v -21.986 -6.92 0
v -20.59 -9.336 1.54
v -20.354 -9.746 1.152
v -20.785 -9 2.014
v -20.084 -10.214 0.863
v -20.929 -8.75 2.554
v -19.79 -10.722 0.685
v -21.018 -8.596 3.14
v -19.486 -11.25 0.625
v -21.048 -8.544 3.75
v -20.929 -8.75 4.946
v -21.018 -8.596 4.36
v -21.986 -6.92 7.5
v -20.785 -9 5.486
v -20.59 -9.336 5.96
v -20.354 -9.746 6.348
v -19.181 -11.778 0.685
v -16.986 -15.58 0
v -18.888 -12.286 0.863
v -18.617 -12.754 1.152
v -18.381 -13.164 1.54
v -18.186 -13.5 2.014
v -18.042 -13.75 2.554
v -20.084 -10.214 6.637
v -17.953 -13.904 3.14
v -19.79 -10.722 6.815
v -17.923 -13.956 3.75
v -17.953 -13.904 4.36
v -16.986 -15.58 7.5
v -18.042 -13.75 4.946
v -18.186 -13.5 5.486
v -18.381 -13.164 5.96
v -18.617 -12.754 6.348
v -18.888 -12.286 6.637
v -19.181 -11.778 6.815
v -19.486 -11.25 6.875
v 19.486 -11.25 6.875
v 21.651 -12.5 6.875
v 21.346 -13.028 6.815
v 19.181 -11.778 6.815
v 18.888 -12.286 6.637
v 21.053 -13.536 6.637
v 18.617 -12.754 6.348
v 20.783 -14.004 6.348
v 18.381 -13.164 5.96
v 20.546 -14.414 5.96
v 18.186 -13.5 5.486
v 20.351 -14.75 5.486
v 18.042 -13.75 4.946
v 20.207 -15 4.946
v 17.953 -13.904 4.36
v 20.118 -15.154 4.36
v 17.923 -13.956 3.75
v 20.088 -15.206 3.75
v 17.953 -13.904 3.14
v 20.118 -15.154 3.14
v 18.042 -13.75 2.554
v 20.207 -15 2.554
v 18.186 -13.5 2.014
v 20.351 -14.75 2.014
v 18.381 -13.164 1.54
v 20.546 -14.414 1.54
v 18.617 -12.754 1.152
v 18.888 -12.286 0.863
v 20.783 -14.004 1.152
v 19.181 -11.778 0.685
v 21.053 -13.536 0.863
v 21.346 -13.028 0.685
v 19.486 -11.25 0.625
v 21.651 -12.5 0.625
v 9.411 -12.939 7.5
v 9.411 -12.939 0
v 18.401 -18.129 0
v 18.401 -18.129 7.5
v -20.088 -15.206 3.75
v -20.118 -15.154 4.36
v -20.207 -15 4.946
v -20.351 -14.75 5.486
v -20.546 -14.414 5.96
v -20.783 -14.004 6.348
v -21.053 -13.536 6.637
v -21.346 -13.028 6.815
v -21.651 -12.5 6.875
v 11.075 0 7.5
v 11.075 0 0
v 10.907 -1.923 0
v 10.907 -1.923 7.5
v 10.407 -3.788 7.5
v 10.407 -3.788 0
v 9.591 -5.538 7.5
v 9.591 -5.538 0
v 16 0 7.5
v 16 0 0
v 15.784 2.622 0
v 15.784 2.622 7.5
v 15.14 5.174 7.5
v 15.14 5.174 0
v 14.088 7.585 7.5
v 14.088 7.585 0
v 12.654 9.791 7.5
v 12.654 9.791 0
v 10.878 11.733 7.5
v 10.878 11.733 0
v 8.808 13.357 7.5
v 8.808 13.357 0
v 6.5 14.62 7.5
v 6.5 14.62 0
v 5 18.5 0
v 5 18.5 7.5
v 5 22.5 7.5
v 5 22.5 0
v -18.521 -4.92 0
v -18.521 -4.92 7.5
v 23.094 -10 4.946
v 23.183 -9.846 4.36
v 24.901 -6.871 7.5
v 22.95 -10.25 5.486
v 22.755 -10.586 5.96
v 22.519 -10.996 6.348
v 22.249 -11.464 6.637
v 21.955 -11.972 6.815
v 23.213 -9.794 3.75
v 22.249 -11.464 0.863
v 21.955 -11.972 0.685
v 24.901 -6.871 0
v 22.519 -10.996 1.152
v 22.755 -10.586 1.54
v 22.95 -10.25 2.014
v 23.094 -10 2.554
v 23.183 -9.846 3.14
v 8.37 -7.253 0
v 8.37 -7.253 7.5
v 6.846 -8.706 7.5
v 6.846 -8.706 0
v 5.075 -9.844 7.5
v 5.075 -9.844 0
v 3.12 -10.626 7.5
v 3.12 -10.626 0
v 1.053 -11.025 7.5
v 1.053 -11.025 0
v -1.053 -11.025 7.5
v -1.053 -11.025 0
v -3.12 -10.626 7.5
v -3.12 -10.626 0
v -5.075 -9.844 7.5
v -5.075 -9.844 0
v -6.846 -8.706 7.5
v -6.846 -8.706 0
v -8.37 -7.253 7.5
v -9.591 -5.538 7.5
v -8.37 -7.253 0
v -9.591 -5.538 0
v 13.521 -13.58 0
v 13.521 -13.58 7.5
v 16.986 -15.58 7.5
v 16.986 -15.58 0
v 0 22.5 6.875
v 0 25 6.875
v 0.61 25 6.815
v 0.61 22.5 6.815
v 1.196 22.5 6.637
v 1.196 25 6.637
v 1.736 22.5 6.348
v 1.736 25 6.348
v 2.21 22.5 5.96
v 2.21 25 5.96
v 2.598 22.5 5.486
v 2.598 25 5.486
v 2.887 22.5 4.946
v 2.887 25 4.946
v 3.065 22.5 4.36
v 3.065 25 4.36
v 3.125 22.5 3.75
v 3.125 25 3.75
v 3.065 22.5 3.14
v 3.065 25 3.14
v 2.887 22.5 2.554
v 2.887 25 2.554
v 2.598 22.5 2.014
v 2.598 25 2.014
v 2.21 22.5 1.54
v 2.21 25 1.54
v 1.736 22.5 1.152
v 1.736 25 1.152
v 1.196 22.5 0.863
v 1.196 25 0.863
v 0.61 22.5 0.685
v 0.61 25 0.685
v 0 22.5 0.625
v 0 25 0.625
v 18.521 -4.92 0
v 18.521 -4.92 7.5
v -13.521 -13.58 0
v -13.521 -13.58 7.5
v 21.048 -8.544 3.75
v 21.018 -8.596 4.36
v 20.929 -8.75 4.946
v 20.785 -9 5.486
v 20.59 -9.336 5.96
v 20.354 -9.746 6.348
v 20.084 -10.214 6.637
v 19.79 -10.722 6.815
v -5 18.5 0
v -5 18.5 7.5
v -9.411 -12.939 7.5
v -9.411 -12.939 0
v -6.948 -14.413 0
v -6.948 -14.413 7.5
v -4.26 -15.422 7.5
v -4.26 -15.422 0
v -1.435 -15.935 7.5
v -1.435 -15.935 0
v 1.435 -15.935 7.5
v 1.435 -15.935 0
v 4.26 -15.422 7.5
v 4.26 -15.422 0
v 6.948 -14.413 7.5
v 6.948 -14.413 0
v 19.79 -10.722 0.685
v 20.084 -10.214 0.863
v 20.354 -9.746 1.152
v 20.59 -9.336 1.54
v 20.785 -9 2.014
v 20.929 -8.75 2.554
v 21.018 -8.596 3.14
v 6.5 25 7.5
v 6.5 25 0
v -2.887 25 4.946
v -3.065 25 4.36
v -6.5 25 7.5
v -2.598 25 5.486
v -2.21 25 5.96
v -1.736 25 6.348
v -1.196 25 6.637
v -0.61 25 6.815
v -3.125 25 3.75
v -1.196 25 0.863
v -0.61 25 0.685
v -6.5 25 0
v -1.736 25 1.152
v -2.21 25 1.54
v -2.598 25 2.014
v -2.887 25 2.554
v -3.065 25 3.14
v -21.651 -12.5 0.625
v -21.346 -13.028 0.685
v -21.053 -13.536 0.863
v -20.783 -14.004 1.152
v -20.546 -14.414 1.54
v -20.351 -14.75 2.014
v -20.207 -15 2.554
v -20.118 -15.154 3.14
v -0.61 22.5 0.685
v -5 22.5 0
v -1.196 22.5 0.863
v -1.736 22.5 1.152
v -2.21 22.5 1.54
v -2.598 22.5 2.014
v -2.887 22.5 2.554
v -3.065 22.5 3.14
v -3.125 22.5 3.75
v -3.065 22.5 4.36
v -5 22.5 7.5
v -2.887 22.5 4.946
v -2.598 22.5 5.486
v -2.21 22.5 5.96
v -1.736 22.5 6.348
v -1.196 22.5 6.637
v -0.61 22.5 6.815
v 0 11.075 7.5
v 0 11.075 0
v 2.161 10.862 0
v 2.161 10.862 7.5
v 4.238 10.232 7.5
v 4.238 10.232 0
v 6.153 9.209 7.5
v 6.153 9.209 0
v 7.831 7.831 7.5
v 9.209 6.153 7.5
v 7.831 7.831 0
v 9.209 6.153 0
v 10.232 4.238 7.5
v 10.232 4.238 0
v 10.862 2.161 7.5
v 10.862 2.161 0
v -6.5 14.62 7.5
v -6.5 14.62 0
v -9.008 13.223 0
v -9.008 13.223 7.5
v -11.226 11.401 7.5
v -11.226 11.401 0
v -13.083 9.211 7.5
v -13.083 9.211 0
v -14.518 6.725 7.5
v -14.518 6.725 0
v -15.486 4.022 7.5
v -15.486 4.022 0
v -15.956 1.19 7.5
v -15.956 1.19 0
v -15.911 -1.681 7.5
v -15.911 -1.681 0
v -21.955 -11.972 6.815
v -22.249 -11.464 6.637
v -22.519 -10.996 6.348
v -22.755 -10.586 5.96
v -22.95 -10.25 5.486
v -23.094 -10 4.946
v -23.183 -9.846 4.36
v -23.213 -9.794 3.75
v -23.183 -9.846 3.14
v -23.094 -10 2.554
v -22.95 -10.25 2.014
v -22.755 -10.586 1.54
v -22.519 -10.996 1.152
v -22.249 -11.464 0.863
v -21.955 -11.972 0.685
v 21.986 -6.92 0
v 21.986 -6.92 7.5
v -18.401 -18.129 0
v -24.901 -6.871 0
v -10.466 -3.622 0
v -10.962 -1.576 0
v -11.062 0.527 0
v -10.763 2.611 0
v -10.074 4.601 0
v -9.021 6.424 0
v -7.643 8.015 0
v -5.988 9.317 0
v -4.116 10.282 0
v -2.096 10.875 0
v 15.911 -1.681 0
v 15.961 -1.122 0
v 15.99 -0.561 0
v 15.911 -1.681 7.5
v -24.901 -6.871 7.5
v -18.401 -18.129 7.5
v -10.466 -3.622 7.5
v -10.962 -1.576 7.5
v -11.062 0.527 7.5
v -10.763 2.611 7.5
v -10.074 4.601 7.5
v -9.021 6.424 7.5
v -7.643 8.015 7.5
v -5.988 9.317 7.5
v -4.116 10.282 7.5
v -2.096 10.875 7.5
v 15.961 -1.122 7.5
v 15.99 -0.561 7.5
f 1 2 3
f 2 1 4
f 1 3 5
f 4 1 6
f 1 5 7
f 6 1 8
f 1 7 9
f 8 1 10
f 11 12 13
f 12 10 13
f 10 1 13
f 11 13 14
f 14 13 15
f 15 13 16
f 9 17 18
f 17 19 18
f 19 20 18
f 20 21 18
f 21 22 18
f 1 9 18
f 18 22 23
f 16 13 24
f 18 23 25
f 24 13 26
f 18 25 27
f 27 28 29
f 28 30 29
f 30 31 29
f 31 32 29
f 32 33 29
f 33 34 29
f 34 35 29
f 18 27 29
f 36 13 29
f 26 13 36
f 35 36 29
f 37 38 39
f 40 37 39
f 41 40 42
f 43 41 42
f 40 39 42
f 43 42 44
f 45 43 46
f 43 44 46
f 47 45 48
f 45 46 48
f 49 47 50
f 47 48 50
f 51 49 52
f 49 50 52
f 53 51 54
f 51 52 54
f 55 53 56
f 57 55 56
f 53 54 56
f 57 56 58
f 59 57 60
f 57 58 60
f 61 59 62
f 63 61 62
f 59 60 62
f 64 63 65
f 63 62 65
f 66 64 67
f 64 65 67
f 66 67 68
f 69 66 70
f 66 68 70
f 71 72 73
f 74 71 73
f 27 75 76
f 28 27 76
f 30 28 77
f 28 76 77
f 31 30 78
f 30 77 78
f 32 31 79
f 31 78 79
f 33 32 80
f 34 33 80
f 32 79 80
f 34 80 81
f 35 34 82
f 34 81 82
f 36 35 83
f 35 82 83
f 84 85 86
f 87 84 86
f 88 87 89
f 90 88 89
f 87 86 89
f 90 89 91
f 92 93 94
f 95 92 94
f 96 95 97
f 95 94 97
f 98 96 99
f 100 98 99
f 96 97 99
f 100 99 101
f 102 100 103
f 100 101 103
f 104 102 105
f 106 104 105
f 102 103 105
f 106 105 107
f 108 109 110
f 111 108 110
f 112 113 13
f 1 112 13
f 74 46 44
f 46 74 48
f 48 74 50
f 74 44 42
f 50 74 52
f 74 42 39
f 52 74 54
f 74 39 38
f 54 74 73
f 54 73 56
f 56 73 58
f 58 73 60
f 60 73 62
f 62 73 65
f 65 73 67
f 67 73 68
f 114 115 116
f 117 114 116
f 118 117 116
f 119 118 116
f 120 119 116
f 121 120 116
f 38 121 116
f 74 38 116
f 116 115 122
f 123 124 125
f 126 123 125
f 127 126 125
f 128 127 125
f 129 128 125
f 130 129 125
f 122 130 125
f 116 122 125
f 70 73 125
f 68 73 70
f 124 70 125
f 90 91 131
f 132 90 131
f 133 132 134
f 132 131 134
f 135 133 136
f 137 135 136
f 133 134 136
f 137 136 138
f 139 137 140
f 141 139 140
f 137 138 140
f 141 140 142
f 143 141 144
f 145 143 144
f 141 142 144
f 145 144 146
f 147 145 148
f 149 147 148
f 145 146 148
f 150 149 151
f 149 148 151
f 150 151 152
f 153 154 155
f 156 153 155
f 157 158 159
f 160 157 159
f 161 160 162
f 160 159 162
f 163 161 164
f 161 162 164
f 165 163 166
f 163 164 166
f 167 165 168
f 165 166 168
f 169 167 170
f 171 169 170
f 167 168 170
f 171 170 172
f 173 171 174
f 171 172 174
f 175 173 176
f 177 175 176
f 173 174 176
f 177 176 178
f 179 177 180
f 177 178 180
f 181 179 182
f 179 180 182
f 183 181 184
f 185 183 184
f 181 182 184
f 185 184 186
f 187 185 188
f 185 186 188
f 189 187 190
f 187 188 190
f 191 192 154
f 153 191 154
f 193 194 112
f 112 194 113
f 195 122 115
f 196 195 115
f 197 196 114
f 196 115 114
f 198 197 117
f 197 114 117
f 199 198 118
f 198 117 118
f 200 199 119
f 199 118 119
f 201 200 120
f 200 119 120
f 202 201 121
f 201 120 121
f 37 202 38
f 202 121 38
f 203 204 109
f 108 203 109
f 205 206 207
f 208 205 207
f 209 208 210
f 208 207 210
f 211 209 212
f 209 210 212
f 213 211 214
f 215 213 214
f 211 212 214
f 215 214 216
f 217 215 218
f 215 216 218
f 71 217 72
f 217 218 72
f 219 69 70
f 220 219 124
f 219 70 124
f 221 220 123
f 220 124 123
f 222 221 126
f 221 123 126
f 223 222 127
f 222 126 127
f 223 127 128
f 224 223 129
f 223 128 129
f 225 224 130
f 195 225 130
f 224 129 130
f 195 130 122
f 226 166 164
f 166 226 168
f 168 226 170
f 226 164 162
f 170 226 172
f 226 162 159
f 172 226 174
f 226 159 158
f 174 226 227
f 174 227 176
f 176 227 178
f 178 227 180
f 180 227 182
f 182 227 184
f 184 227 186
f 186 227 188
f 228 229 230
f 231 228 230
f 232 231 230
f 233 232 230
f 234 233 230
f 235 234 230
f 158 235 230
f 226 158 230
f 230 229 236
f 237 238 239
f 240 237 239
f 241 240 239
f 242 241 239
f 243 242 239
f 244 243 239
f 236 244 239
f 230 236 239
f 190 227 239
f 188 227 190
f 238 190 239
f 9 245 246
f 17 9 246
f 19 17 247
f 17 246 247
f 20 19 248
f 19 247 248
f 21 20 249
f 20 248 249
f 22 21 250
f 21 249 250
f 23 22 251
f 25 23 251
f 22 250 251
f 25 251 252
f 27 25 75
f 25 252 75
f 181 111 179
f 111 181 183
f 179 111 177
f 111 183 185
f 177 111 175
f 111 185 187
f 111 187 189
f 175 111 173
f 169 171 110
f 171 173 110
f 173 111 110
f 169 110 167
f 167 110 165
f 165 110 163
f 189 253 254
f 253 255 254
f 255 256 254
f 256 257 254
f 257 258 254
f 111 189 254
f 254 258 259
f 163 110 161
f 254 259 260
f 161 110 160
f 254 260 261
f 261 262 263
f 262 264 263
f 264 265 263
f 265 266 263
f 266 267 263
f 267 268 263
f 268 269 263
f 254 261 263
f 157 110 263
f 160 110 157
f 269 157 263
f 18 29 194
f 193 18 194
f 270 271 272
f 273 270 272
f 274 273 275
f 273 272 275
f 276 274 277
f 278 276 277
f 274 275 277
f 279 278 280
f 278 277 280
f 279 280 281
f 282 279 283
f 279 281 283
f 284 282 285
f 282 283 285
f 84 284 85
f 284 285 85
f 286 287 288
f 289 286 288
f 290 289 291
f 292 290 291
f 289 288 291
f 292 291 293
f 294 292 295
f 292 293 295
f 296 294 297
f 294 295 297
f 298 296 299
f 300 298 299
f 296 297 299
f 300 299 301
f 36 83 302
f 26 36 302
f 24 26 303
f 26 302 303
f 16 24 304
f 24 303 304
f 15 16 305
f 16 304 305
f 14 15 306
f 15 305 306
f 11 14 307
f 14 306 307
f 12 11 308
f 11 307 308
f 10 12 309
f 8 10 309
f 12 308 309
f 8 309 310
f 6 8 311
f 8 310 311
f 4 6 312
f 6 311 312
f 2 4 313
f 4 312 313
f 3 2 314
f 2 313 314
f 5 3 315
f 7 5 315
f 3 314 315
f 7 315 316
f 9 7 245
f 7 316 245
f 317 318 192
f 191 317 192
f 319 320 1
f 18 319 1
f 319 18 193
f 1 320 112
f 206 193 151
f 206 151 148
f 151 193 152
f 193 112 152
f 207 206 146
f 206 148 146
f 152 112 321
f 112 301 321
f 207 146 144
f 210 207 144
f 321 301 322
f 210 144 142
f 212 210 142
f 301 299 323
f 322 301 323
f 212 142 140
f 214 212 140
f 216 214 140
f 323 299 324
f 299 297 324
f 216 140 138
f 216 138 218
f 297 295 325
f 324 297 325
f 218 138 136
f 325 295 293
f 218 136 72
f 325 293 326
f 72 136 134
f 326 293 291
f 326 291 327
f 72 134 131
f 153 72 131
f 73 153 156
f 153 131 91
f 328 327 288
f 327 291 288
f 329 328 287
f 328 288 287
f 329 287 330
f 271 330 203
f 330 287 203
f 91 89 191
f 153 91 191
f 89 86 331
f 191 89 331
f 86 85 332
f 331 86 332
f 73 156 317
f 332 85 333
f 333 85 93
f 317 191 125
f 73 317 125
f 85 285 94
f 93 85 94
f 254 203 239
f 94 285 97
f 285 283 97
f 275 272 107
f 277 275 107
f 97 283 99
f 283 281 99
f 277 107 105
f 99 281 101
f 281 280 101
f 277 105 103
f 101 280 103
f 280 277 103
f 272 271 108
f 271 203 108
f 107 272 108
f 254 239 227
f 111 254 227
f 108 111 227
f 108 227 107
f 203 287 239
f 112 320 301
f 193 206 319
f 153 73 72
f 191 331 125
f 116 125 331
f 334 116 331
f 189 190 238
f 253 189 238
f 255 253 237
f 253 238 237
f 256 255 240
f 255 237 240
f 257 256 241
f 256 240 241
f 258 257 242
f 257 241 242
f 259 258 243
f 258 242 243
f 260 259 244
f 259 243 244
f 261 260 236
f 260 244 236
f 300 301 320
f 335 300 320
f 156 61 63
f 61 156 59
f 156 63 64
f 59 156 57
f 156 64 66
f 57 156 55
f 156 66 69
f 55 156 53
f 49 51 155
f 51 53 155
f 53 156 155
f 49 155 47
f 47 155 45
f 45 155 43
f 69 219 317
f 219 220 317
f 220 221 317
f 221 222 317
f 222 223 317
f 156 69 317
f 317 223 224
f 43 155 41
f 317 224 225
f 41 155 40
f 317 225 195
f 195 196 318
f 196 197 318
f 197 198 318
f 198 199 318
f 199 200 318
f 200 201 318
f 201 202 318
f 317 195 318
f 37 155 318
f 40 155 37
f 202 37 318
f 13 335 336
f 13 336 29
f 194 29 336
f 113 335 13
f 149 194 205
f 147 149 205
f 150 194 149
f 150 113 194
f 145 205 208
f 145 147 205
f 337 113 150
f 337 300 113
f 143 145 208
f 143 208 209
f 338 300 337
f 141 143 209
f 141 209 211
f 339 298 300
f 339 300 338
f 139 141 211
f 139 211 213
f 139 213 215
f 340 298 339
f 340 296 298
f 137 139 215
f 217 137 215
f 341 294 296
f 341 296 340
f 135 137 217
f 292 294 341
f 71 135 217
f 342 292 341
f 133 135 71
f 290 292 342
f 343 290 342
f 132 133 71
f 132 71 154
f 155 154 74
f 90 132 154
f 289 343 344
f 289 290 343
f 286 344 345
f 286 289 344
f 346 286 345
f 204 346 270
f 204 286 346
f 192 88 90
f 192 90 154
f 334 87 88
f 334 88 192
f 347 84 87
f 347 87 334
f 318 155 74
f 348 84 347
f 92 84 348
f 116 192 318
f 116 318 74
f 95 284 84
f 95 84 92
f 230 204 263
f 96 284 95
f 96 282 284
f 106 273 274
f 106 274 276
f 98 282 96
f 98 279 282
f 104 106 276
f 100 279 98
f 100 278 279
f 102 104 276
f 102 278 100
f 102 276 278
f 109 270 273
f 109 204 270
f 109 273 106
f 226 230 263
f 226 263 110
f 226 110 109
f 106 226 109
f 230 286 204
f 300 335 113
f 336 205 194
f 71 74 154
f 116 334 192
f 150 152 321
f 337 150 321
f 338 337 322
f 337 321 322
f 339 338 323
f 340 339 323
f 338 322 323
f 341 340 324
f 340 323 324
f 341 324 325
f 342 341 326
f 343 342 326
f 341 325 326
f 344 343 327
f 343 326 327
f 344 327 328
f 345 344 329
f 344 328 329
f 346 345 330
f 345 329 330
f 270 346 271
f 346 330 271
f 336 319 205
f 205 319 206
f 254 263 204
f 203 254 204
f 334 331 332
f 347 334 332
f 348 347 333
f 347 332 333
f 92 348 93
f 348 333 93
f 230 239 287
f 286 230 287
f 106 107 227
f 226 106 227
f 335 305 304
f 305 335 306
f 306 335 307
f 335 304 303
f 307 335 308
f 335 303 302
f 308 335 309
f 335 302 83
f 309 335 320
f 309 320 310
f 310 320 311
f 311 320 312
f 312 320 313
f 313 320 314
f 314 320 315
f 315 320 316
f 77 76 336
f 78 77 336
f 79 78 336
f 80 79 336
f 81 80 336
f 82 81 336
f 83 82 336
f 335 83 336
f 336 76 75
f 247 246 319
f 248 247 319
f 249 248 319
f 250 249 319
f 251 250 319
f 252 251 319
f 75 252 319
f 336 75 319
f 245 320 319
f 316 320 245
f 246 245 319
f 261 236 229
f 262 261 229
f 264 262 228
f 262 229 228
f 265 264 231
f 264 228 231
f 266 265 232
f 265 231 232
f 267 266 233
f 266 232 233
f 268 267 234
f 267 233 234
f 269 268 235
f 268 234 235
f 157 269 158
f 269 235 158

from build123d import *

# Parameters (mm, degrees)
F1_DEPTH = 7.5
F3_DEPTH = 25
F5_DEPTH = 6
F7_DEPTH = 6
F9_DEPTH = 6


with BuildPart() as f1:
    # F0 (on Top) → F1 (new body)
    with BuildSketch(Plane.XY):
        with BuildLine():
            ThreePointArc((-9.5912313469, -5.5375), (-9.5912313469, 5.5375), (0, 11.075))
            Line((0, 11.075), (0, 16))
            ThreePointArc((0, 16), (-3.3224189775, 15.6512469835), (-6.5, 14.6201915172))
            ThreePointArc((-6.5, 14.6201915172), (-13.8564064606, 8), (-15.9114572621, -1.680930634))
            ThreePointArc((-15.9114572621, -1.680930634), (-15.2155869774, -4.9483242552), (-13.8564064606, -8))
            Line((-13.8564064606, -8), (-9.5912313469, -5.5375))
        make_face()
        with BuildLine():
            ThreePointArc((0, 11.075), (7.8312076016, 7.8312076016), (11.075, 0))
            ThreePointArc((11.075, 0), (10.6976285262, -2.8664209245), (9.5912313469, -5.5375))
            Line((9.5912313469, -5.5375), (13.8564064606, -8))
            ThreePointArc((13.8564064606, -8), (15.2155869774, -4.9483242552), (15.9114572621, -1.680930634))
            ThreePointArc((15.9114572621, -1.680930634), (15.9778489822, -0.8416305028), (16, 0))
            ThreePointArc((16, 0), (13.416407865, 8.7177978871), (6.5, 14.6201915172))
            ThreePointArc((6.5, 14.6201915172), (3.3224189775, 15.6512469835), (0, 16))
            Line((0, 16), (0, 11.075))
        make_face()
        with BuildLine():
            Line((13.8564064606, -8), (9.5912313469, -5.5375))
            ThreePointArc((9.5912313469, -5.5375), (0, -11.075), (-9.5912313469, -5.5375))
            Line((-9.5912313469, -5.5375), (-13.8564064606, -8))
            ThreePointArc((-13.8564064606, -8), (-11.8931679998, -10.7029227283), (-9.4114572621, -12.9392608832))
            ThreePointArc((-9.4114572621, -12.9392608832), (0, -16), (9.4114572621, -12.9392608832))
            ThreePointArc((9.4114572621, -12.9392608832), (11.8931679998, -10.7029227283), (13.8564064606, -8))
        make_face()
        with BuildLine():
            Line((0, 25), (0, 16))
            ThreePointArc((0, 16), (3.3224189775, 15.6512469835), (6.5, 14.6201915172))
            Line((6.5, 14.6201915172), (6.5, 25))
            Line((6.5, 25), (0, 25))
        make_face()
        with BuildLine():
            ThreePointArc((-6.5, 14.6201915172), (-3.3224189775, 15.6512469835), (0, 16))
            Line((0, 16), (0, 25))
            Line((0, 25), (-6.5, 25))
            Line((-6.5, 25), (-6.5, 14.6201915172))
        make_face()
        with BuildLine():
            Line((-21.6506350946, -12.5), (-13.8564064606, -8))
            ThreePointArc((-13.8564064606, -8), (-15.2155869774, -4.9483242552), (-15.9114572621, -1.680930634))
            Line((-15.9114572621, -1.680930634), (-24.9006350946, -6.8708348754))
            Line((-24.9006350946, -6.8708348754), (-21.6506350946, -12.5))
        make_face()
        with BuildLine():
            ThreePointArc((-9.4114572621, -12.9392608832), (-11.8931679998, -10.7029227283), (-13.8564064606, -8))
            Line((-13.8564064606, -8), (-21.6506350946, -12.5))
            Line((-21.6506350946, -12.5), (-18.4006350946, -18.1291651246))
            Line((-18.4006350946, -18.1291651246), (-9.4114572621, -12.9392608832))
        make_face()
        with BuildLine():
            Line((21.6506350946, -12.5), (13.8564064606, -8))
            ThreePointArc((13.8564064606, -8), (11.8931679998, -10.7029227283), (9.4114572621, -12.9392608832))
            Line((9.4114572621, -12.9392608832), (18.4006350946, -18.1291651246))
            Line((18.4006350946, -18.1291651246), (21.6506350946, -12.5))
        make_face()
        with BuildLine():
            ThreePointArc((15.9114572621, -1.680930634), (15.2155869774, -4.9483242552), (13.8564064606, -8))
            Line((13.8564064606, -8), (21.6506350946, -12.5))
            Line((21.6506350946, -12.5), (24.9006350946, -6.8708348754))
            Line((24.9006350946, -6.8708348754), (15.9114572621, -1.680930634))
        make_face()
    extrude(amount=F1_DEPTH)

    # F2 (on face) → F3 (cut)
    with BuildSketch(Plane.XY.offset(7.5)):
        Polygon((5, 22.5), (0, 22.5), (-5, 22.5), (-5, 18.5), (5, 18.5), align=None)
        Polygon((-21.9855715851, -6.9198729811), (-19.4855715851, -11.25), (-16.02146997, -9.25), (-18.52146997, -4.9198729811), align=None)
        Polygon((-16.02146997, -9.25), (-19.4855715851, -11.25), (-16.9855715851, -15.5801270189), (-13.52146997, -13.5801270189), align=None)
        Polygon((16.9855715851, -15.5801270189), (19.4855715851, -11.25), (16.02146997, -9.25), (13.52146997, -13.5801270189), align=None)
        Polygon((16.02146997, -9.25), (19.4855715851, -11.25), (21.9855715851, -6.9198729811), (18.52146997, -4.9198729811), align=None)
    extrude(amount=-F3_DEPTH, mode=Mode.SUBTRACT)

    # F4 (on face) → F5 (cut)
    with BuildSketch(Plane(origin=(21.6506350946, -12.5, 0), x_dir=(0.5, 0.8660254038, 0), z_dir=(0.8660254038, -0.5, 0))):
        with BuildLine():
            ThreePointArc((0, 6.875), (-3.125, 3.75), (0, 0.625))
            Line((0, 0.625), (0, 6.875))
        make_face()
        with BuildLine():
            Line((0, 6.875), (0, 0.625))
            ThreePointArc((0, 0.625), (2.2097086912, 1.5402913088), (3.125, 3.75))
            ThreePointArc((3.125, 3.75), (2.2097086912, 5.9597086912), (0, 6.875))
        make_face()
    extrude(amount=-F5_DEPTH, mode=Mode.SUBTRACT)

    # F6 (on face) → F7 (cut)
    with BuildSketch(Plane(origin=(0, 25, 0), x_dir=(-1, 0, 0), z_dir=(0, 1, 0))):
        with BuildLine():
            Line((0, 6.875), (0, 0.625))
            ThreePointArc((0, 0.625), (2.2097086912, 1.5402913088), (3.125, 3.75))
            ThreePointArc((3.125, 3.75), (2.2097086912, 5.9597086912), (0, 6.875))
        make_face()
        with BuildLine():
            ThreePointArc((0, 6.875), (-3.125, 3.75), (0, 0.625))
            Line((0, 0.625), (0, 6.875))
        make_face()
    extrude(amount=-F7_DEPTH, mode=Mode.SUBTRACT)

    # F8 (on face) → F9 (cut)
    with BuildSketch(Plane(origin=(-21.6506350946, -12.5, 0), x_dir=(0.5, -0.8660254038, 0), z_dir=(-0.8660254038, -0.5, 0))):
        with BuildLine():
            ThreePointArc((3.125, 3.75), (2.2097086912, 5.9597086912), (0, 6.875))
            Line((0, 6.875), (0, 0.625))
            ThreePointArc((0, 0.625), (2.2097086912, 1.5402913088), (3.125, 3.75))
        make_face()
        with BuildLine():
            Line((0, 0.625), (0, 6.875))
            ThreePointArc((0, 6.875), (-3.125, 3.75), (0, 0.625))
        make_face()
    extrude(amount=-F9_DEPTH, mode=Mode.SUBTRACT)


solid = f1.part
